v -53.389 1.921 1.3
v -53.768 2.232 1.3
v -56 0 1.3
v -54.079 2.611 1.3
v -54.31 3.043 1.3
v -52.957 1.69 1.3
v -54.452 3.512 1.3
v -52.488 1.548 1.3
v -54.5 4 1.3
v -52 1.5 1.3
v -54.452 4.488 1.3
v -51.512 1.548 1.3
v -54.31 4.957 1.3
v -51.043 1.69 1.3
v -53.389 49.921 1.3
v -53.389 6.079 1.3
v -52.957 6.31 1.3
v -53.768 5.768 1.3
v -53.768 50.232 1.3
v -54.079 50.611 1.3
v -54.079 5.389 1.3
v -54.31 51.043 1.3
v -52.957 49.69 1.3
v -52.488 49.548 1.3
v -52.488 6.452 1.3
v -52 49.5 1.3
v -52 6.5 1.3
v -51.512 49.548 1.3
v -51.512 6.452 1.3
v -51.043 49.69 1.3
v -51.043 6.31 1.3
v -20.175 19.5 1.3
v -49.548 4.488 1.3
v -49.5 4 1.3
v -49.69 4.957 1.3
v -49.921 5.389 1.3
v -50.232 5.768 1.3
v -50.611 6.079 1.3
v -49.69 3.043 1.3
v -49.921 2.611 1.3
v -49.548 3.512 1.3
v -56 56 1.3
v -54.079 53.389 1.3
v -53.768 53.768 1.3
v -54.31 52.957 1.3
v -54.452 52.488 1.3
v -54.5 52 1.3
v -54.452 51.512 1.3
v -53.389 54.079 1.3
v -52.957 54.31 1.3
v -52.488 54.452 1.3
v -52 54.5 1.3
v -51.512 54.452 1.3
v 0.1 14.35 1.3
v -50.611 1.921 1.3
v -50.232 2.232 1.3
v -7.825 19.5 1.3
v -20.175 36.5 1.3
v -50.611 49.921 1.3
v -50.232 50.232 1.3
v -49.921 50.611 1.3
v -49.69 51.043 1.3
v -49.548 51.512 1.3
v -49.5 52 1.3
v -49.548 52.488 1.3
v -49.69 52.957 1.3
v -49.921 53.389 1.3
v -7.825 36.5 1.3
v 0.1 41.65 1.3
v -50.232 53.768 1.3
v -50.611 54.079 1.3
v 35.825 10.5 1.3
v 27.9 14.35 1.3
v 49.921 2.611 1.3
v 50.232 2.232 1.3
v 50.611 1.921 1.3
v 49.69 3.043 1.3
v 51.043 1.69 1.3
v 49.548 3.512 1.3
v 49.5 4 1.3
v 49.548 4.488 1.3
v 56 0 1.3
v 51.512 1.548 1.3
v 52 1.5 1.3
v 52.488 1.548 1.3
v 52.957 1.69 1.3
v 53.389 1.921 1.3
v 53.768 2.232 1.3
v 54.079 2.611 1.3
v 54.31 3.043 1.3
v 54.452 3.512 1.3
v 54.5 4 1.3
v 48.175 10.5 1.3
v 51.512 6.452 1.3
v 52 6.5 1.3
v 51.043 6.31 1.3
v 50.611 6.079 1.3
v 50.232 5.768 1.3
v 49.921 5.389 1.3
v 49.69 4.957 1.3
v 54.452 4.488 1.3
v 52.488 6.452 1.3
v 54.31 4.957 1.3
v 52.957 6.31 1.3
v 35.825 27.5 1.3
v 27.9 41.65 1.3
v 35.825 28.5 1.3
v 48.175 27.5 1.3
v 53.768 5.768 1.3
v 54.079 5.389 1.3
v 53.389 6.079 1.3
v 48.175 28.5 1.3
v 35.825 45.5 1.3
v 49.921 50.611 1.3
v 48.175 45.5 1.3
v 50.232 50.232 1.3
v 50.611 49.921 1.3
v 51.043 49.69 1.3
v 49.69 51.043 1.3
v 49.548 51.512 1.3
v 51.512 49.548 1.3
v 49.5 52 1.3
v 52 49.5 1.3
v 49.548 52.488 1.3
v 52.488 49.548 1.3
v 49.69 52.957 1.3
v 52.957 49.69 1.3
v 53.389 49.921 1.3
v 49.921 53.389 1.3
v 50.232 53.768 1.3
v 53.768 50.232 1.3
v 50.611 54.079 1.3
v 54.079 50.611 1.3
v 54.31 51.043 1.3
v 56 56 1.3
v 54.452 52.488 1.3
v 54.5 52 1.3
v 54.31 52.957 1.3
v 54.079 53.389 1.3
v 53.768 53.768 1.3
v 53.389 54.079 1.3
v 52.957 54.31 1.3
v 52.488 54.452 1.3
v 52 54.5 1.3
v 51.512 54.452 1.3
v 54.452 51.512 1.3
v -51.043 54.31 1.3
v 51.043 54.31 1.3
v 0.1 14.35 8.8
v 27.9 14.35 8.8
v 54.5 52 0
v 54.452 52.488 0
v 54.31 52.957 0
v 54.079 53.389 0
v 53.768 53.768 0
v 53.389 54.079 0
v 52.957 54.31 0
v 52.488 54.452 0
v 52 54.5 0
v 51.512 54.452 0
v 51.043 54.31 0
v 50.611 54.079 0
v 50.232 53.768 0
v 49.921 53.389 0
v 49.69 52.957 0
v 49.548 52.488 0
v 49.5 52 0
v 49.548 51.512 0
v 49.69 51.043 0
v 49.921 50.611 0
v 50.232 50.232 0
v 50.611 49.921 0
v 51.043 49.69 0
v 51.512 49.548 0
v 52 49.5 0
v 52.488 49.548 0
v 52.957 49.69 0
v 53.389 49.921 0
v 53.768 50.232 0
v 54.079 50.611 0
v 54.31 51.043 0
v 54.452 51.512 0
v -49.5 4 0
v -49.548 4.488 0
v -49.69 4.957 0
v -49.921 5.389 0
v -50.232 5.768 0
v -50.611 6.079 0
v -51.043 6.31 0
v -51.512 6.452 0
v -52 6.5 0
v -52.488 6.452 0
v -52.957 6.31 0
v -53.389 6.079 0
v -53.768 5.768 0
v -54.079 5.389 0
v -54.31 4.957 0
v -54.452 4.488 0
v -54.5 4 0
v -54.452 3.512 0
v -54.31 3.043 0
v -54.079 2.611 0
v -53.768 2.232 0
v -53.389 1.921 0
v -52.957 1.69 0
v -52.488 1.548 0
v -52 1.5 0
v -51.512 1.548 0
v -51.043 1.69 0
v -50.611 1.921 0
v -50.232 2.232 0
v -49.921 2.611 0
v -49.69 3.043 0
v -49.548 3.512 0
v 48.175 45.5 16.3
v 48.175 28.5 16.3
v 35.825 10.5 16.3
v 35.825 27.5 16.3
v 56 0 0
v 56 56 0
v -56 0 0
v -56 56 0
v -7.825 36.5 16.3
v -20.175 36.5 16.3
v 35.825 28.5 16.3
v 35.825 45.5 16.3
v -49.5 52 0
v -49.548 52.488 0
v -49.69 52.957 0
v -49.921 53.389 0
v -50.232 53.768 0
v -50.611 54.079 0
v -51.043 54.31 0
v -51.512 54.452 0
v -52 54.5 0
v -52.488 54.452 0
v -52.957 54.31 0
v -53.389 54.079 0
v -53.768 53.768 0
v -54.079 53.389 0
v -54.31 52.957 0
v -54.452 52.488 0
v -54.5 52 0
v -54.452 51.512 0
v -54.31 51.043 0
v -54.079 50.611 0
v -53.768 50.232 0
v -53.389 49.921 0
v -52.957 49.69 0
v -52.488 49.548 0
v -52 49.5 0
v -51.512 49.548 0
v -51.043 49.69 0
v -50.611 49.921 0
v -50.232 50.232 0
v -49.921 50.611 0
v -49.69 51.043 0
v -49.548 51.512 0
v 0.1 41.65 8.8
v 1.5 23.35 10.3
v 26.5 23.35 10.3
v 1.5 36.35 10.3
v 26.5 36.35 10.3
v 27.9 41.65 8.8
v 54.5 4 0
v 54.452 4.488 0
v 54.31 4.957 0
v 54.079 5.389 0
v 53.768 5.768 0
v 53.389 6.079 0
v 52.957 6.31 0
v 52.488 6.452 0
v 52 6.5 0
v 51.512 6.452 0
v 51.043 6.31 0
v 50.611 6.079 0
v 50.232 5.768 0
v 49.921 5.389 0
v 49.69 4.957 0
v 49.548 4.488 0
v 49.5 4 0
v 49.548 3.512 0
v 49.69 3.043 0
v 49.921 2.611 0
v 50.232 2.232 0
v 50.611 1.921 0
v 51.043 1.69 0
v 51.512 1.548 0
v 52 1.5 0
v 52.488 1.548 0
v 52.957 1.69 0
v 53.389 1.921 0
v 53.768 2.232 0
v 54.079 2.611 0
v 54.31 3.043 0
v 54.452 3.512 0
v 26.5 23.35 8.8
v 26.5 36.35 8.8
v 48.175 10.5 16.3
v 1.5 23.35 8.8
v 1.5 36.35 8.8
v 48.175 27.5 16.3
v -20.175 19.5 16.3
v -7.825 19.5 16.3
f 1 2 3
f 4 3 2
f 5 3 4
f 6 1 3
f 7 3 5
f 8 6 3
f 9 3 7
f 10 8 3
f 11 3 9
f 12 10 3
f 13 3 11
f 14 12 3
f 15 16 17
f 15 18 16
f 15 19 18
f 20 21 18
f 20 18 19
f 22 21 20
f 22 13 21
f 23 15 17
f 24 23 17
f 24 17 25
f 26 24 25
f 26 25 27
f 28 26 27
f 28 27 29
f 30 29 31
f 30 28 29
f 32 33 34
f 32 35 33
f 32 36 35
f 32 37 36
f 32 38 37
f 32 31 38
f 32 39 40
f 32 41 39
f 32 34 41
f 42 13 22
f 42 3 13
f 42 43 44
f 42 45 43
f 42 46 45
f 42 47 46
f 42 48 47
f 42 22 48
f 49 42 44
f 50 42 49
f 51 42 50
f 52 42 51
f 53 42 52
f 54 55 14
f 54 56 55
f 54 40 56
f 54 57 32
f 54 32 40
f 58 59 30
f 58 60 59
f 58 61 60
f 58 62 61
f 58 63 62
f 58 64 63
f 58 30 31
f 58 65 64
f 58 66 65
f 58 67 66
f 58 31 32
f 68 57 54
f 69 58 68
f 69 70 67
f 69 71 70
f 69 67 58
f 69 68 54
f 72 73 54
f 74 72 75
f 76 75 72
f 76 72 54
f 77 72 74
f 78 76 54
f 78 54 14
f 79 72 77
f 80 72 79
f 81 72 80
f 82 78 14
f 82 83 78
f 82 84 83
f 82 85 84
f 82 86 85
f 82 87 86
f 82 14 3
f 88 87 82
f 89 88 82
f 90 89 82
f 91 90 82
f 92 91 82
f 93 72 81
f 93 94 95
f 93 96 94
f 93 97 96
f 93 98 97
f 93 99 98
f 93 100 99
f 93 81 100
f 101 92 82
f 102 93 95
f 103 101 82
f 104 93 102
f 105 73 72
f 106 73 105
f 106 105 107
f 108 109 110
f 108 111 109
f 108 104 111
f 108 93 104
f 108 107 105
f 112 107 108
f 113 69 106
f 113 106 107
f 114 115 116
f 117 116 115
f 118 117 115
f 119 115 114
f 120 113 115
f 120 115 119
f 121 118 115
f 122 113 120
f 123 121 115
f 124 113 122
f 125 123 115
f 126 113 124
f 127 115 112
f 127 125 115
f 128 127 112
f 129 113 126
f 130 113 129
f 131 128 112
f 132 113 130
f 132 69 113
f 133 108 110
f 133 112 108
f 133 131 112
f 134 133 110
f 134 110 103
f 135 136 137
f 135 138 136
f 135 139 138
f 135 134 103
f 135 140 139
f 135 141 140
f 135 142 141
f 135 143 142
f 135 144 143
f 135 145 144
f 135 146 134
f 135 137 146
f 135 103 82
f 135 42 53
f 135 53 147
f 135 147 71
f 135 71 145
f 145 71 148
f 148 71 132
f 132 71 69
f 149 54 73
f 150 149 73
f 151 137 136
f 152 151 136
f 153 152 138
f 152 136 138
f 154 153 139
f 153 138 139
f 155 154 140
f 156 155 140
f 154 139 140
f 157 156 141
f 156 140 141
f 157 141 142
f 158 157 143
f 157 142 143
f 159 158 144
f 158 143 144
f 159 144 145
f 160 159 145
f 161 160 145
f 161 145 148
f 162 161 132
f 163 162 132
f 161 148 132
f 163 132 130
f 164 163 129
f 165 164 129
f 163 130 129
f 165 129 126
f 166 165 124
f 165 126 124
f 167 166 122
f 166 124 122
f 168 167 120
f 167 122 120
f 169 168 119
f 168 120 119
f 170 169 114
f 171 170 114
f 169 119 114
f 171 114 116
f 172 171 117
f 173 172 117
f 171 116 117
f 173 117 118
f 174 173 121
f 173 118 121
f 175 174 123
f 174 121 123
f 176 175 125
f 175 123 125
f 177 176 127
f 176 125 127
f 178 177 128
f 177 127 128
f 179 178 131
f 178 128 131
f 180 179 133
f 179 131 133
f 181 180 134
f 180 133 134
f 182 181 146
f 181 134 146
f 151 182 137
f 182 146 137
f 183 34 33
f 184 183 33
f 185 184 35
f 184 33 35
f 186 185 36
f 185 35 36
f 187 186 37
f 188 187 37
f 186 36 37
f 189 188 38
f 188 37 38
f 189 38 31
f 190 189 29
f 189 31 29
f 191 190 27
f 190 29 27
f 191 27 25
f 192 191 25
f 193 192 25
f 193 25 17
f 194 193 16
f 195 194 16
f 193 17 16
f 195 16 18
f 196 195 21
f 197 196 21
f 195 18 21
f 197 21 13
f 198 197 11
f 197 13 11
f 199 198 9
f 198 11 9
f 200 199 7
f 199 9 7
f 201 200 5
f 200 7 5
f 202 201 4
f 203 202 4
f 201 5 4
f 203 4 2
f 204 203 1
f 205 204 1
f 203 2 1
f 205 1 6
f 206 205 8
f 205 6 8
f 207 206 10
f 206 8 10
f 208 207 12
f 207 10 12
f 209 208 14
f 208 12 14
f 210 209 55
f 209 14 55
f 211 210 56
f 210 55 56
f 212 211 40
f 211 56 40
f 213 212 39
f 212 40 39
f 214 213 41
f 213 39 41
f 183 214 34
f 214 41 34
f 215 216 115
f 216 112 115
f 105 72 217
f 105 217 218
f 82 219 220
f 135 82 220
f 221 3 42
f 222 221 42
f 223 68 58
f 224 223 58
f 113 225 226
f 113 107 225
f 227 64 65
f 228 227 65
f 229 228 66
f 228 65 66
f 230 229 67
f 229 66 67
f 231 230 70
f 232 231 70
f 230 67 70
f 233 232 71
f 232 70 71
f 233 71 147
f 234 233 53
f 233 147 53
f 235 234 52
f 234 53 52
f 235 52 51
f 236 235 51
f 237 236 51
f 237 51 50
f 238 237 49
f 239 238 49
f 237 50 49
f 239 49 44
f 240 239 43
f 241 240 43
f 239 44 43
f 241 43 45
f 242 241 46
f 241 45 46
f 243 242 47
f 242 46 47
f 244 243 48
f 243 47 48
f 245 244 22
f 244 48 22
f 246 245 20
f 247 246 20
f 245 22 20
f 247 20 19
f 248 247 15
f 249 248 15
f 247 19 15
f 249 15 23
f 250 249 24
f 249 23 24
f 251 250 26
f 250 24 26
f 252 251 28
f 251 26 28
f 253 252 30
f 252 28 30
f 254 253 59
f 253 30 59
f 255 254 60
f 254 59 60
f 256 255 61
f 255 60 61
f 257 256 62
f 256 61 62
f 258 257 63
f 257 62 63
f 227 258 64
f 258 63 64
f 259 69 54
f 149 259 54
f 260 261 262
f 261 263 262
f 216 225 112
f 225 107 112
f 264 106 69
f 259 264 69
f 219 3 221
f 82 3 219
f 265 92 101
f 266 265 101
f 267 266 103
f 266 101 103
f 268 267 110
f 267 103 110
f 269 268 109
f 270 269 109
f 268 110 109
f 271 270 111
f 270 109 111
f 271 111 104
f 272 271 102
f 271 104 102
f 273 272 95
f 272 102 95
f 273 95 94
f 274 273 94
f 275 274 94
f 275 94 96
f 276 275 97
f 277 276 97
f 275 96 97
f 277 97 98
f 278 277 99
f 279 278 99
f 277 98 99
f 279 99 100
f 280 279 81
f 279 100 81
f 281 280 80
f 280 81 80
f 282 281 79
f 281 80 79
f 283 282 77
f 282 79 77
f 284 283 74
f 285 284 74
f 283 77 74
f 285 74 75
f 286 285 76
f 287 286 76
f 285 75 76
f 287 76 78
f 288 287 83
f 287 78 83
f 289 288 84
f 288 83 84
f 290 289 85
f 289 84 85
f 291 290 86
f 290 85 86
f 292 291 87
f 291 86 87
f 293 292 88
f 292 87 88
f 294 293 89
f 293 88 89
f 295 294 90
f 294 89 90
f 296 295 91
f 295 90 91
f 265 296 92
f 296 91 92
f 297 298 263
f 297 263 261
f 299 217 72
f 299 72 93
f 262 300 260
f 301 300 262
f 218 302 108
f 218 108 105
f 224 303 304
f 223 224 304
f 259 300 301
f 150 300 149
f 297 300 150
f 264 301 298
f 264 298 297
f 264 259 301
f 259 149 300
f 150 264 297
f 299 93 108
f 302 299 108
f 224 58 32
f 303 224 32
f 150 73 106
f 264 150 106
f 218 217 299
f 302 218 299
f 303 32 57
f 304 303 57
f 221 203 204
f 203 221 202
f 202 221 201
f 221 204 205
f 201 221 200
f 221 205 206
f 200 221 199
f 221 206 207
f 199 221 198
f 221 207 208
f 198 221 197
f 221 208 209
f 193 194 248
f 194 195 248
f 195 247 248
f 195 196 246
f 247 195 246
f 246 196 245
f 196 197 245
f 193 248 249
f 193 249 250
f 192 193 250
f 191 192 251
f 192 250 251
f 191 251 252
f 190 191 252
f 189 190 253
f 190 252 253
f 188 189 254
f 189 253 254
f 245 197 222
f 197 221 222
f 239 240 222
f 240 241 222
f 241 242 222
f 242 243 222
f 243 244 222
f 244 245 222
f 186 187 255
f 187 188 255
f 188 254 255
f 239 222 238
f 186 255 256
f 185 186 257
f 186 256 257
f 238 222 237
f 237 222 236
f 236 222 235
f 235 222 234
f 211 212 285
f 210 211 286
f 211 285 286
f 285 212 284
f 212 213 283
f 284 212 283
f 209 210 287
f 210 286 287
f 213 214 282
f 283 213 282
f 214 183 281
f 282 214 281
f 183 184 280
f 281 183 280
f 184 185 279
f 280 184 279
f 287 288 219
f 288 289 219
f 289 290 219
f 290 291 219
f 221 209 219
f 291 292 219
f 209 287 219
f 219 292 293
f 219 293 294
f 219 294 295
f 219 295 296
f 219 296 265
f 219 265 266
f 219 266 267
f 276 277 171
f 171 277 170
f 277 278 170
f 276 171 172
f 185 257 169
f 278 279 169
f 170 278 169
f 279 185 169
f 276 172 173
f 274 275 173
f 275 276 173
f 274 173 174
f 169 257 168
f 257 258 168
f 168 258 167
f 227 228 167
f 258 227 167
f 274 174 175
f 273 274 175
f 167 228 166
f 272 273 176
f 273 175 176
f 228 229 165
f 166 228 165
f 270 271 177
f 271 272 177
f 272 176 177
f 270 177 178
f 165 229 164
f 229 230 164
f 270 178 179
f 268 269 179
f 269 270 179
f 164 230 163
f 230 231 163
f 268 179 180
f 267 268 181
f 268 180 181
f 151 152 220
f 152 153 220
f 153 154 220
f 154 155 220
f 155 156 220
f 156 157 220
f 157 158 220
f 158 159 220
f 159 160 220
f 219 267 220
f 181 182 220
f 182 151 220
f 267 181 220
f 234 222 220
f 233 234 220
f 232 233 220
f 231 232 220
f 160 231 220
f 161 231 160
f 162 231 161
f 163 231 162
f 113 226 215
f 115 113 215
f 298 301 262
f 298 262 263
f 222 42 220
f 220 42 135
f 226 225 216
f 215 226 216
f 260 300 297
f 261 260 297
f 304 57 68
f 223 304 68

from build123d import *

# Parameters (mm, degrees)
SKETCH1_W           = 56
SKETCH1_H           = 56
BOSS_EXTRUDE1_DEPTH = 1.3
SKETCH2_W           = 6.175
SKETCH2_H           = 17
BOSS_EXTRUDE2_DEPTH = 7.5
SKETCH3_W           = 12.35
SKETCH3_H           = 17
BOSS_EXTRUDE3_DEPTH = 7.5
BOSS_EXTRUDE4_DEPTH = 1.5
SKETCH5_W           = 56
SKETCH5_H           = 56
BOSS_EXTRUDE5_DEPTH = 1.3
SKETCH7_R           = 2.5
CUT_EXTRUDE1_DEPTH  = 1.3
SKETCH8_W           = 6.175
SKETCH8_H           = 8.5
BOSS_EXTRUDE6_DEPTH = 15


with BuildPart() as part:
    # Sketch1 → Boss-Extrude1 (new body)
    with BuildSketch(Plane.XY):
        with Locations((28, 28)):
            Rectangle(SKETCH1_W, SKETCH1_H)
    extrude(amount=BOSS_EXTRUDE1_DEPTH)

    # Sketch2 → Boss-Extrude2 (add)
    with BuildSketch(Plane.XY.offset(1.3)):
        Polygon((14, 28), (14, 41.65), (0.1, 41.65), (0.1, 14.35), (14, 14.35), align=None)
        Polygon((27.9, 41.65), (14, 41.65), (14, 28), (14, 14.35), (27.9, 14.35), align=None)
        with Locations((38.9125, 37)):
            Rectangle(SKETCH2_W, SKETCH2_H)
        with Locations((45.0875, 37)):
            Rectangle(SKETCH2_W, SKETCH2_H)
        with Locations((45.0875, 19)):
            Rectangle(SKETCH2_W, SKETCH2_H)
        with Locations((38.9125, 19)):
            Rectangle(SKETCH2_W, SKETCH2_H)
    extrude(amount=BOSS_EXTRUDE2_DEPTH)

    # Sketch3 → Boss-Extrude3 (add)
    with BuildSketch(Plane.XY.offset(8.8)):
        with Locations((42, 37)):
            Rectangle(SKETCH3_W, SKETCH3_H)
        with Locations((42, 19)):
            Rectangle(SKETCH3_W, SKETCH3_H)
    extrude(amount=BOSS_EXTRUDE3_DEPTH)

    # Sketch4 → Boss-Extrude4 (add)
    with BuildSketch(Plane.XY.offset(8.8)):
        Polygon((26.5, 23.35), (14, 23.35), (1.5, 23.35), (1.5, 36.35), (26.5, 36.35), align=None)
    extrude(amount=BOSS_EXTRUDE4_DEPTH)

    # Sketch5 → Boss-Extrude5 (add)
    with BuildSketch(Plane.XY.offset(1.3)):
        with Locations((-28, 28)):
            Rectangle(SKETCH5_W, SKETCH5_H)
    extrude(amount=-BOSS_EXTRUDE5_DEPTH)

    # Sketch7 → Cut-Extrude1 (cut)
    with BuildSketch(Plane.XY.offset(1.3)):
        with Locations((-52, 52)):
            Circle(SKETCH7_R)
        with Locations((-52, 4)):
            Circle(SKETCH7_R)
        with Locations((52, 4)):
            Circle(SKETCH7_R)
        with Locations((52, 52)):
            Circle(SKETCH7_R)
    extrude(amount=-CUT_EXTRUDE1_DEPTH, mode=Mode.SUBTRACT)

    # Sketch8 → Boss-Extrude6 (add)
    with BuildSketch(Plane.XY.offset(1.3)):
        Polygon((-7.825, 36.5), (-14, 36.5), (-14, 28), (-14, 19.5), (-7.825, 19.5), align=None)
        with Locations((-17.0875, 32.25)):
            Rectangle(SKETCH8_W, SKETCH8_H)
        with Locations((-17.0875, 23.75)):
            Rectangle(SKETCH8_W, SKETCH8_H)
    extrude(amount=BOSS_EXTRUDE6_DEPTH)


solid = part.part
